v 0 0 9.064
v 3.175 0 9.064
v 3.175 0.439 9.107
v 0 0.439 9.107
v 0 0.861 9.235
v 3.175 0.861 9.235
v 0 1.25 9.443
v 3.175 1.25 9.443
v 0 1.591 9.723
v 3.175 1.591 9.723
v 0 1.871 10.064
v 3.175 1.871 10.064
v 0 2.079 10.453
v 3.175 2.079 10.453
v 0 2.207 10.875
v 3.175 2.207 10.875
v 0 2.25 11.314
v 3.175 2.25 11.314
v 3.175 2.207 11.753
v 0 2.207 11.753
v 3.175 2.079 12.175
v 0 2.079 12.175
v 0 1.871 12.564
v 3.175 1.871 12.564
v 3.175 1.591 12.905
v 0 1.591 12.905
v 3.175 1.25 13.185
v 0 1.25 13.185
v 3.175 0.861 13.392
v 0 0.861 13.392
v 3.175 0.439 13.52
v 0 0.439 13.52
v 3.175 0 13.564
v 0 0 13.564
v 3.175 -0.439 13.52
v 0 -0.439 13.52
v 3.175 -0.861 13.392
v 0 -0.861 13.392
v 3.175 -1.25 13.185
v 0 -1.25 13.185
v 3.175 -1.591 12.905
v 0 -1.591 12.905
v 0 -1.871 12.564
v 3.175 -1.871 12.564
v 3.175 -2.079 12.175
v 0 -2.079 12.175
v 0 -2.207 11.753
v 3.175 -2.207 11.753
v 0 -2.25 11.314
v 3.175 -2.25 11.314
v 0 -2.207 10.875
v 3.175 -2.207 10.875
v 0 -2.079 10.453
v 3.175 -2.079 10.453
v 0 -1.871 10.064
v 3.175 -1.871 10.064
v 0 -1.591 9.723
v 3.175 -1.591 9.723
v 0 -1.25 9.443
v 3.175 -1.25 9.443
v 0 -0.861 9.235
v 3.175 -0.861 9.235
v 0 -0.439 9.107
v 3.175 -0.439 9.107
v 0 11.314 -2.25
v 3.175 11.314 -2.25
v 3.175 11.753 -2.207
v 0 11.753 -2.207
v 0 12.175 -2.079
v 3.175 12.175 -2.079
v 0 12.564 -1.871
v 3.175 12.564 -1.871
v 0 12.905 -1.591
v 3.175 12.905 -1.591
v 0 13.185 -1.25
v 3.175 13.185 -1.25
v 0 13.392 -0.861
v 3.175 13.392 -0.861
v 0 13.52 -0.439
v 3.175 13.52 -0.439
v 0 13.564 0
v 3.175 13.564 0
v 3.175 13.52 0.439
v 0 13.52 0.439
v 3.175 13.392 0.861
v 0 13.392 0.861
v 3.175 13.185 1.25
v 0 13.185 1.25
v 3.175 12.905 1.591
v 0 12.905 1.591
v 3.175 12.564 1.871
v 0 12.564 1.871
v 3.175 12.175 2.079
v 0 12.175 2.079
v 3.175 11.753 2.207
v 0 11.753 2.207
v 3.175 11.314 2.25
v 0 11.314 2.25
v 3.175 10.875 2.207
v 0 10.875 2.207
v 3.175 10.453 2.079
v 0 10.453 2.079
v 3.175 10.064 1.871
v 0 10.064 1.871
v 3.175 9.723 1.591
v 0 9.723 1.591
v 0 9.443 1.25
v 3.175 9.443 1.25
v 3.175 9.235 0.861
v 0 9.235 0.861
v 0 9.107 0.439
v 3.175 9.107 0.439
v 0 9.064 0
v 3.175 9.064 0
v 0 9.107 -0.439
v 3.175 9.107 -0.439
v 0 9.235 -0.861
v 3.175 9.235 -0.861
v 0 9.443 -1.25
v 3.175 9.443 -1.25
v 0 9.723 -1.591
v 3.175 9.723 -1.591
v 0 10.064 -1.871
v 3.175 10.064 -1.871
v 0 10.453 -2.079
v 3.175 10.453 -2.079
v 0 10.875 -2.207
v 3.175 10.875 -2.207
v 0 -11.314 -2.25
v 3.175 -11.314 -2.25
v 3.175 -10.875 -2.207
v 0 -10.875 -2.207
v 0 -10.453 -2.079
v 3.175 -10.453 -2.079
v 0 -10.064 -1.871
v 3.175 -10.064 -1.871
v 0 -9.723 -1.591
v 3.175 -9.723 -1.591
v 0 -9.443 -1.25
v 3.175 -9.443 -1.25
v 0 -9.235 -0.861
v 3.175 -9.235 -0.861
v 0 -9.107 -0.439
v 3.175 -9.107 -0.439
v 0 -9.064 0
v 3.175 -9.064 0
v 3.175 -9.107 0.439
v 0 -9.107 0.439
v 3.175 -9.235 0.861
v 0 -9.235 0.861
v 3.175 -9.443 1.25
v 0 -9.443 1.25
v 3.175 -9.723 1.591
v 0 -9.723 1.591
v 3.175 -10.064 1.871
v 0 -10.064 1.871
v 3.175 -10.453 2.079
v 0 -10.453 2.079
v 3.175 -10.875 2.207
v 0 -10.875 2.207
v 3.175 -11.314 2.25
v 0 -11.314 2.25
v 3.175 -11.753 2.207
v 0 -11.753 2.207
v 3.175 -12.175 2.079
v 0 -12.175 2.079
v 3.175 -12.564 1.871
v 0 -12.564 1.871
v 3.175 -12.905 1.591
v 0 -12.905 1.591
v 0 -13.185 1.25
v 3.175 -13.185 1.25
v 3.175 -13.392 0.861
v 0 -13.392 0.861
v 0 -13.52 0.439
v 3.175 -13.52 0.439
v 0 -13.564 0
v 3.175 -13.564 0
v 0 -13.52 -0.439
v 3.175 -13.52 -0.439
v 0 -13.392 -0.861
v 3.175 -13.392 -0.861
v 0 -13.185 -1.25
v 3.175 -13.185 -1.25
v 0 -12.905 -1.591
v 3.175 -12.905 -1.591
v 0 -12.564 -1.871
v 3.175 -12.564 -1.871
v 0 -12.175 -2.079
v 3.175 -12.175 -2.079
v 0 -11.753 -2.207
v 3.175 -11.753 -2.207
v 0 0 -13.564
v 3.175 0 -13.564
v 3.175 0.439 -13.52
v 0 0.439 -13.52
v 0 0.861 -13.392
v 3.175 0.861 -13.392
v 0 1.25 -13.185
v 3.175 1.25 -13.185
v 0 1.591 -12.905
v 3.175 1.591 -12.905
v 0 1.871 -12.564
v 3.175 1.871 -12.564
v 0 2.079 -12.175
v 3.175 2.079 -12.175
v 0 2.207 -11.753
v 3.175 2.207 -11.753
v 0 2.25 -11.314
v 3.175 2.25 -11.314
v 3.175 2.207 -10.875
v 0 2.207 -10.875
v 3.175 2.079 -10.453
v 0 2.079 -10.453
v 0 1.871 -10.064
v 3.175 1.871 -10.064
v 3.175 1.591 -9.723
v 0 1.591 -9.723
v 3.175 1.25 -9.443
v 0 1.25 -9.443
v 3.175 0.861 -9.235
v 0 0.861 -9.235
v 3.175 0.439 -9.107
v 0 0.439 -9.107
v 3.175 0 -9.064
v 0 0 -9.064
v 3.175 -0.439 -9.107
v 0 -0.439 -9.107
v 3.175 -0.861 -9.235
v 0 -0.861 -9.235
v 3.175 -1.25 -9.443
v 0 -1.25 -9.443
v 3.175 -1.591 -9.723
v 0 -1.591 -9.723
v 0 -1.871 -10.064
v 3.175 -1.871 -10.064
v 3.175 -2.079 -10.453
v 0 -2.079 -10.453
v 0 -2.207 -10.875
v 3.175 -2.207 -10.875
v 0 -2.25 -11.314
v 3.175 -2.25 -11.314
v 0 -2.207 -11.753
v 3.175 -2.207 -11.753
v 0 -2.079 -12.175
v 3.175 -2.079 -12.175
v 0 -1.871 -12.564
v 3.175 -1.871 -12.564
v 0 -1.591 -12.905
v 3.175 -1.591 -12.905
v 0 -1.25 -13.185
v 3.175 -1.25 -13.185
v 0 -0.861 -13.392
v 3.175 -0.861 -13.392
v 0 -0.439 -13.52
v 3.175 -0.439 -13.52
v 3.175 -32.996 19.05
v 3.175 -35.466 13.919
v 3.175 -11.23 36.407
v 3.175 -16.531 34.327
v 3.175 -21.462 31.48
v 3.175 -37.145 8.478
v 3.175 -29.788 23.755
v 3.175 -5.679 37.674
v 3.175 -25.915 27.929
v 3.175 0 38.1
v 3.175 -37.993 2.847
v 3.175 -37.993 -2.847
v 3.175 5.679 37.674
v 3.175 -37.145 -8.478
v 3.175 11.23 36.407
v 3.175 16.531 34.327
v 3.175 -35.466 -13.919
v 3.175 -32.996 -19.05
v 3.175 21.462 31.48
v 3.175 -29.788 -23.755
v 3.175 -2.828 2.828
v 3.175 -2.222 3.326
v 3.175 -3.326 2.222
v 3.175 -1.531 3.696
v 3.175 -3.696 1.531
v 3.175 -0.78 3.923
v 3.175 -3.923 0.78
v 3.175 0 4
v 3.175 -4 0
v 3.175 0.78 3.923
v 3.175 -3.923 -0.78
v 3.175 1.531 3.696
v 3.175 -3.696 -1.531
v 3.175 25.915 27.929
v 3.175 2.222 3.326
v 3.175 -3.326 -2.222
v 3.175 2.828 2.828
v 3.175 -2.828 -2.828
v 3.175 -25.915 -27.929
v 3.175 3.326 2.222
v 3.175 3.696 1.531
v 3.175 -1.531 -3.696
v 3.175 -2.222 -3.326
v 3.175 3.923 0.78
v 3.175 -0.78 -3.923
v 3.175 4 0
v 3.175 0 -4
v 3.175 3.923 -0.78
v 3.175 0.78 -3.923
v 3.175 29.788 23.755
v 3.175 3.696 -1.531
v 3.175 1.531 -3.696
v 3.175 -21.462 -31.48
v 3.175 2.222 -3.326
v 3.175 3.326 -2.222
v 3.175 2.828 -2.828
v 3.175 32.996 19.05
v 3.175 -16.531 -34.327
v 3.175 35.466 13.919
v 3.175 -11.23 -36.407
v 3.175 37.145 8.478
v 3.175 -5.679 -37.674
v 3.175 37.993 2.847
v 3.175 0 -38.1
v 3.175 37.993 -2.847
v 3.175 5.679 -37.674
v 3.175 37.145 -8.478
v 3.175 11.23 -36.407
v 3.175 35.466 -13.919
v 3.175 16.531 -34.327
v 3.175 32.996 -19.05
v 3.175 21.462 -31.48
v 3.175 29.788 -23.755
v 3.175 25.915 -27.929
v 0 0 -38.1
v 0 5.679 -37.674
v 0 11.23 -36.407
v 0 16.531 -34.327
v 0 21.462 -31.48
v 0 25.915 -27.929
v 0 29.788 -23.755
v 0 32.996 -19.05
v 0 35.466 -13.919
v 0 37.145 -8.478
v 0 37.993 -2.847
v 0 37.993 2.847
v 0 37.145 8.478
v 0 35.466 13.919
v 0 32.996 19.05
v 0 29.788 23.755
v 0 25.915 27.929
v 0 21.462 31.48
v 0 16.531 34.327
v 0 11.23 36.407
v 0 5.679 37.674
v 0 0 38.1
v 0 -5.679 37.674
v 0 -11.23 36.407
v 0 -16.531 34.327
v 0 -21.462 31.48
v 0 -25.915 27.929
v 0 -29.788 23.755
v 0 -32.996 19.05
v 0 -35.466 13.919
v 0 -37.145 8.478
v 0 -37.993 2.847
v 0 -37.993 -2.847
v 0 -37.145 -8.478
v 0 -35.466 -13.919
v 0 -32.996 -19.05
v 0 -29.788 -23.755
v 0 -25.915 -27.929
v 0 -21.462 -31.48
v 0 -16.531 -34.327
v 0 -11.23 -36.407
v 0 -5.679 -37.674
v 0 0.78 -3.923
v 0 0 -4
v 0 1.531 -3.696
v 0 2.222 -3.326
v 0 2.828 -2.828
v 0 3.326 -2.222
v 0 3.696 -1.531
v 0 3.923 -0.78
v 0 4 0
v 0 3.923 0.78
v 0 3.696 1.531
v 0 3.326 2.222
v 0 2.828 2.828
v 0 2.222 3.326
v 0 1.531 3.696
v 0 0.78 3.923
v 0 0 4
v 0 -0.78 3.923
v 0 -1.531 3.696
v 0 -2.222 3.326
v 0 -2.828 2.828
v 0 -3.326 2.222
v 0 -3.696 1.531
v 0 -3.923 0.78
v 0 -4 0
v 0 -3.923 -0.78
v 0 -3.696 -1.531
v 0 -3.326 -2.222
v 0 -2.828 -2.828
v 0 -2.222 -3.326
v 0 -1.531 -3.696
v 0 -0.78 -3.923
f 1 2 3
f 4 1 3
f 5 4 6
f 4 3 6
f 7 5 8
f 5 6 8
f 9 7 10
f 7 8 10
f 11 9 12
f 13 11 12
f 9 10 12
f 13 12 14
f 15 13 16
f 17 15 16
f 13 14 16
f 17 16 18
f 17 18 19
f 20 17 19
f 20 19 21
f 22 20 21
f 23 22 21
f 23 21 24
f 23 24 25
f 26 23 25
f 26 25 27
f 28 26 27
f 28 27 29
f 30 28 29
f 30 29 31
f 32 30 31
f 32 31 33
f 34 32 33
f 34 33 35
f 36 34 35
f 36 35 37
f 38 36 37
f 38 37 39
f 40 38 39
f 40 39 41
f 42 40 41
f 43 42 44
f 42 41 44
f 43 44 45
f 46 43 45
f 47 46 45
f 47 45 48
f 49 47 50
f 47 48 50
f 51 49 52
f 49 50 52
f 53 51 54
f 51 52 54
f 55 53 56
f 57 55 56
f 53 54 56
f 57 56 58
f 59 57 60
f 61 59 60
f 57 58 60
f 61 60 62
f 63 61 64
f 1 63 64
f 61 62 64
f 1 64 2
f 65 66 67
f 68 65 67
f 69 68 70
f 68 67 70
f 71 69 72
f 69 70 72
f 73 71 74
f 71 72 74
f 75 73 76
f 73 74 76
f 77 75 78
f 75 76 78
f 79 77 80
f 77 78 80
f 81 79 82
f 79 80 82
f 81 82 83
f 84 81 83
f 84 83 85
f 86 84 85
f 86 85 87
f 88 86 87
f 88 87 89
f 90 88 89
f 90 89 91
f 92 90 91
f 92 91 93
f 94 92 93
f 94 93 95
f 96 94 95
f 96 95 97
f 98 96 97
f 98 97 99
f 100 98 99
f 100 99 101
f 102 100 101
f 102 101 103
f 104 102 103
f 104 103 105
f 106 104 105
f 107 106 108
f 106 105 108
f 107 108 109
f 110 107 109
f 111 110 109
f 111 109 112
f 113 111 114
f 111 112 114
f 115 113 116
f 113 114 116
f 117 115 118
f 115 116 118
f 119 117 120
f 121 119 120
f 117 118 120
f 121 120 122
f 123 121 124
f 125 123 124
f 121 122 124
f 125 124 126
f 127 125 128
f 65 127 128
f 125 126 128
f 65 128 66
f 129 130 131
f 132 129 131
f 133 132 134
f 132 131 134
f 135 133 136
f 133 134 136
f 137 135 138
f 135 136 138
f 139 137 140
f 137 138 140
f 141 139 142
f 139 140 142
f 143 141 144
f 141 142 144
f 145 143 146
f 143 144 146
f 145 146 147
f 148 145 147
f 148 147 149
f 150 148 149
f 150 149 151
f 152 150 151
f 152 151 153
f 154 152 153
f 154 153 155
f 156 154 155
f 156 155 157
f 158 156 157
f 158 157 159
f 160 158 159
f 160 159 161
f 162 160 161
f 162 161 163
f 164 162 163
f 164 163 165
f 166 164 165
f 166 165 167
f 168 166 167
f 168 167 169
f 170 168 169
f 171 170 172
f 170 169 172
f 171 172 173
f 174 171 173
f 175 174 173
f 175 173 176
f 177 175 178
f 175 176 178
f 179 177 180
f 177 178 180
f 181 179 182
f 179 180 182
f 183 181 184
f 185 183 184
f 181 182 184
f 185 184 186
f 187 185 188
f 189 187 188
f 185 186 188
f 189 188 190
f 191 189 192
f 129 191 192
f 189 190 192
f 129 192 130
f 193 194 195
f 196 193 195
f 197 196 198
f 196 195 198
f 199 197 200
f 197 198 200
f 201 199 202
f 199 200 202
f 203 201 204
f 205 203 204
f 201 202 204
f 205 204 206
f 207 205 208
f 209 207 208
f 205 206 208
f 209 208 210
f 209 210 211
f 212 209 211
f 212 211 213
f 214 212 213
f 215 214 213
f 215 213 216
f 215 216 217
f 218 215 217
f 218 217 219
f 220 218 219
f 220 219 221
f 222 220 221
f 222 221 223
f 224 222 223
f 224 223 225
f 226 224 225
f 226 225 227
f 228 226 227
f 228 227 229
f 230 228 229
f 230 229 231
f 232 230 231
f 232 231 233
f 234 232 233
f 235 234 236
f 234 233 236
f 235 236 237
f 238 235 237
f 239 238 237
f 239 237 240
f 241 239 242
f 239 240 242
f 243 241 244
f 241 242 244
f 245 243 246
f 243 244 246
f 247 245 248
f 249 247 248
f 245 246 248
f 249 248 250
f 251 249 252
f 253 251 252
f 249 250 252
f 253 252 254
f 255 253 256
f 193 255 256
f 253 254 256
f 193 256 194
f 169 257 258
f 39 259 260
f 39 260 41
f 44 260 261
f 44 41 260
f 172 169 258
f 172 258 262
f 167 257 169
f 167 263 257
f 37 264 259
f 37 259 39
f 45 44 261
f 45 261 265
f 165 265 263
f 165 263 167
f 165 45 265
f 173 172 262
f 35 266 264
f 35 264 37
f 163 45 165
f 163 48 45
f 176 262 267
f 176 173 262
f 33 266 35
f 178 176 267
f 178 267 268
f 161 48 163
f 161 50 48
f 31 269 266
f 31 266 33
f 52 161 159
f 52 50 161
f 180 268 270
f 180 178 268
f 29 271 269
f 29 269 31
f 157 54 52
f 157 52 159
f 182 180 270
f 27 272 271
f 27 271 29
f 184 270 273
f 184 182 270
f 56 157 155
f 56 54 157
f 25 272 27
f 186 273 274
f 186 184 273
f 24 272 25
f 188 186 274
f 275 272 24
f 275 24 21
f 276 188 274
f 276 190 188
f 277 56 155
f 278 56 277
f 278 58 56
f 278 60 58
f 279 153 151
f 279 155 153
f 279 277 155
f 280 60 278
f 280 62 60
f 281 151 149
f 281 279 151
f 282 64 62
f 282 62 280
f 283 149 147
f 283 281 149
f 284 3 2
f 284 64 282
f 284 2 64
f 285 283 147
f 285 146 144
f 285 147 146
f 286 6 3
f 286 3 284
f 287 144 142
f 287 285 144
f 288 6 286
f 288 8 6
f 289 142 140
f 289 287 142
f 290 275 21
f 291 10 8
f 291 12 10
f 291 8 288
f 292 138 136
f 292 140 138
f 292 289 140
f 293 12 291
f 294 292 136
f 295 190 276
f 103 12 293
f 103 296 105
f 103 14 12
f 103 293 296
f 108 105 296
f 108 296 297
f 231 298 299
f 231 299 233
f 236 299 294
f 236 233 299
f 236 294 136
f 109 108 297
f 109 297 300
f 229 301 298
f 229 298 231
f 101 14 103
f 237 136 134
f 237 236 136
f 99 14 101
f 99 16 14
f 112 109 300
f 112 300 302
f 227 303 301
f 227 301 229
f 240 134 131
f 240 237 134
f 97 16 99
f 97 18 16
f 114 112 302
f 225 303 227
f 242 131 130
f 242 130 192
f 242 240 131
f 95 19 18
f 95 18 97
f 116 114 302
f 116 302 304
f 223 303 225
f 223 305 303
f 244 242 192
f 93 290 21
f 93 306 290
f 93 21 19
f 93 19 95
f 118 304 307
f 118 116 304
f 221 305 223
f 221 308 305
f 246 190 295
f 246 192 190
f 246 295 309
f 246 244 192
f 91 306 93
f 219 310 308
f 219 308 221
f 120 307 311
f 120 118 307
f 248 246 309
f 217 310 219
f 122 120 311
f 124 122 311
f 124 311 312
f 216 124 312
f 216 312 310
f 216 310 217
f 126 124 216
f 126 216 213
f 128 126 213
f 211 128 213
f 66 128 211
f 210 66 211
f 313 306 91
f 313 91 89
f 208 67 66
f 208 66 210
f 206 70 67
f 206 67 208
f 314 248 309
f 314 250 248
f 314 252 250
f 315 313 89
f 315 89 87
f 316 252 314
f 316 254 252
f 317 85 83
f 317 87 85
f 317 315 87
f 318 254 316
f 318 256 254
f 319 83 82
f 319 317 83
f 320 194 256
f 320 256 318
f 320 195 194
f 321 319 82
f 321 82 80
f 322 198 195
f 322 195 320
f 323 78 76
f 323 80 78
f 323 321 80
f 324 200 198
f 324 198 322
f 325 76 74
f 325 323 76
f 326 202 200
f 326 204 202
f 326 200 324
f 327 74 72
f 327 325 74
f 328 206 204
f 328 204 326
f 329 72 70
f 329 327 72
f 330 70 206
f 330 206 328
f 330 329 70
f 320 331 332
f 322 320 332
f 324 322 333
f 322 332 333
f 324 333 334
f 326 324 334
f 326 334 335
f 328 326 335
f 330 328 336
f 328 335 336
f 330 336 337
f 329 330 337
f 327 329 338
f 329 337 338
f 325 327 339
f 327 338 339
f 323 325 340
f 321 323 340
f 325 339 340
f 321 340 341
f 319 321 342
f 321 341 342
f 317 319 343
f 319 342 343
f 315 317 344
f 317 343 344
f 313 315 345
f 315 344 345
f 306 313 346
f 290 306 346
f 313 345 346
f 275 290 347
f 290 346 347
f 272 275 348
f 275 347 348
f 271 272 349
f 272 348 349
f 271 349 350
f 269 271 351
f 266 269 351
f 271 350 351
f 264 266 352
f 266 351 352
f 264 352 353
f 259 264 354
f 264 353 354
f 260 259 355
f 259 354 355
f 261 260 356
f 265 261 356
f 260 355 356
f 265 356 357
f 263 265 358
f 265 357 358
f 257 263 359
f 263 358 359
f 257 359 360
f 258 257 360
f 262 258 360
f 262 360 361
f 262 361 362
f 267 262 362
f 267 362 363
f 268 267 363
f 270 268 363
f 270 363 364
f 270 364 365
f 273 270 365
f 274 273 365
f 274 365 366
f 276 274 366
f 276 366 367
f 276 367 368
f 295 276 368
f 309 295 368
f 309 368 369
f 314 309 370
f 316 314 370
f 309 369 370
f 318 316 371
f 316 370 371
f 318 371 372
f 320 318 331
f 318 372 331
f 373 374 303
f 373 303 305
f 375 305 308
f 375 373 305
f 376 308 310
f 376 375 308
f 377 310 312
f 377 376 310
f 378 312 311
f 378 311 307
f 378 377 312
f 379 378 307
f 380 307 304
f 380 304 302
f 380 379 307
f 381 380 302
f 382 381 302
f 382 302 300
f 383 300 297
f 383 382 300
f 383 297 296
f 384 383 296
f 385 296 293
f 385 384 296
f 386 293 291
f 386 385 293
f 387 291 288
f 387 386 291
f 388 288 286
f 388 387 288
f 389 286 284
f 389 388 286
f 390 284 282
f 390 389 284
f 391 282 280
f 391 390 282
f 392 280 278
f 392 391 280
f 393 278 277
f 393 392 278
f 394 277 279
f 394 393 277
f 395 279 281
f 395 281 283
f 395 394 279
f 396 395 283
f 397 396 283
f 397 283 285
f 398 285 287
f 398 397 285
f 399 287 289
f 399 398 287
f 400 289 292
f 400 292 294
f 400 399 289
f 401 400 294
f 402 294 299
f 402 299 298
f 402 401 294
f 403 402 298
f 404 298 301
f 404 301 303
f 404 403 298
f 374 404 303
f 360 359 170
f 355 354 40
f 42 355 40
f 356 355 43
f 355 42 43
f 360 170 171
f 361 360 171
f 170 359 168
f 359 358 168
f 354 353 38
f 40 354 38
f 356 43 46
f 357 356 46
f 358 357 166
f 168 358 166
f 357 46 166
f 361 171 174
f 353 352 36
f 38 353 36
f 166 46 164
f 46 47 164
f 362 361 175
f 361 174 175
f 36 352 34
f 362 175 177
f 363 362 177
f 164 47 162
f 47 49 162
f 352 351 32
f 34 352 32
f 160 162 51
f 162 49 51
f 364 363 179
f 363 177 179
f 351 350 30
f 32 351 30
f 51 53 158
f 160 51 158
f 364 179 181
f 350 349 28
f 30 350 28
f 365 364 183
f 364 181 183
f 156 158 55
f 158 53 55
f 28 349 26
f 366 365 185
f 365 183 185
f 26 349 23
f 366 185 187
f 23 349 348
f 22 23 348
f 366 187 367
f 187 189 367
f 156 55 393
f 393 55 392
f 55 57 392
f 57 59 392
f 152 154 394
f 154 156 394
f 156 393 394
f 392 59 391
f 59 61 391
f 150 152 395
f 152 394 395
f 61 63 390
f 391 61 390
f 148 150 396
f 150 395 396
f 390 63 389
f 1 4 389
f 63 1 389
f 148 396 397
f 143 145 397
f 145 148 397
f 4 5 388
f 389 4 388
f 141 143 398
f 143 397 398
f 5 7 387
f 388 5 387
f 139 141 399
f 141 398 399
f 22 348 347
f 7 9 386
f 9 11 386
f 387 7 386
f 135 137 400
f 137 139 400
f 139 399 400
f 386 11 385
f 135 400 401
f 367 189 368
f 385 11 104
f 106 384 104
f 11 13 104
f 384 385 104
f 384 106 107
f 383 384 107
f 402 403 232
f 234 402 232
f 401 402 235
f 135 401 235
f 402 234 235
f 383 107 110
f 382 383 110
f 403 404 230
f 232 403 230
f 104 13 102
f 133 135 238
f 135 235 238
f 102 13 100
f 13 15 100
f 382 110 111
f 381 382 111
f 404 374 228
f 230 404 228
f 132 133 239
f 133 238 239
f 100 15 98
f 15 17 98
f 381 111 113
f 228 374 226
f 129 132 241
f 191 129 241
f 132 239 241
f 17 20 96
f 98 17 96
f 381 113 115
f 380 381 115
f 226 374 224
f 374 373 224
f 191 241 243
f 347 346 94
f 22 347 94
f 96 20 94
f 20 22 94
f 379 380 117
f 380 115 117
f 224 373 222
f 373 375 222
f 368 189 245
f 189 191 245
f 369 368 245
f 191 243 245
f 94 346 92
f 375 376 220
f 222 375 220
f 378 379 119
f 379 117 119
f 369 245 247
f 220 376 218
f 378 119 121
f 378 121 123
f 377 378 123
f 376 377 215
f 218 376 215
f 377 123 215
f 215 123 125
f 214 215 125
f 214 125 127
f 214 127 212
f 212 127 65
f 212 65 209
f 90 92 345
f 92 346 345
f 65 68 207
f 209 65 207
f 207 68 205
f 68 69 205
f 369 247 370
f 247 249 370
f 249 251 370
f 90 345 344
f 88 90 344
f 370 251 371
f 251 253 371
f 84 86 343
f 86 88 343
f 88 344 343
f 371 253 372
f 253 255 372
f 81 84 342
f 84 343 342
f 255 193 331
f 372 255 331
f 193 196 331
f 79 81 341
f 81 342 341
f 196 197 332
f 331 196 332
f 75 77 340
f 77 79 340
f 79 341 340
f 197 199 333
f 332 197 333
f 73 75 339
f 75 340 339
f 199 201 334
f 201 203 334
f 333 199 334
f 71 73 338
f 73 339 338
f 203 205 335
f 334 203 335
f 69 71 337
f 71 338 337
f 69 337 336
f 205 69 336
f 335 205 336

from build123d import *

# Parameters (mm, degrees)
SKETCH1_R           = 38.1
SKETCH1_R_2         = 4
BOSS_EXTRUDE2_DEPTH = 3.175
SKETCH4_R           = 2.25
CUT_EXTRUDE3_DEPTH  = 30.394


with BuildPart() as part:
    # Sketch1 → Boss-Extrude2 (new body)
    with BuildSketch(Plane.YZ):
        with Locations(Location((0, 0, 0), (0, 0, 270))):
            Circle(SKETCH1_R)
        with Locations(Location((0, 0, 0), (0, 0, 270))):
            Circle(SKETCH1_R_2, mode=Mode.SUBTRACT)
    extrude(amount=BOSS_EXTRUDE2_DEPTH)

    # Sketch4 → Cut-Extrude3 (cut)
    with BuildSketch(Plane.YZ.offset(3.175)):
        with Locations(Location((0, 11.313708499, 0), (0, 0, 270))):
            Circle(SKETCH4_R)
        with Locations(Location((11.313708499, 0, 0), (0, 0, 270))):
            Circle(SKETCH4_R)
        with Locations(Location((-11.313708499, 0, 0), (0, 0, 270))):
            Circle(SKETCH4_R)
        with Locations(Location((0, -11.313708499, 0), (0, 0, 270))):
            Circle(SKETCH4_R)
    extrude(amount=-CUT_EXTRUDE3_DEPTH, mode=Mode.SUBTRACT)


solid = part.part
